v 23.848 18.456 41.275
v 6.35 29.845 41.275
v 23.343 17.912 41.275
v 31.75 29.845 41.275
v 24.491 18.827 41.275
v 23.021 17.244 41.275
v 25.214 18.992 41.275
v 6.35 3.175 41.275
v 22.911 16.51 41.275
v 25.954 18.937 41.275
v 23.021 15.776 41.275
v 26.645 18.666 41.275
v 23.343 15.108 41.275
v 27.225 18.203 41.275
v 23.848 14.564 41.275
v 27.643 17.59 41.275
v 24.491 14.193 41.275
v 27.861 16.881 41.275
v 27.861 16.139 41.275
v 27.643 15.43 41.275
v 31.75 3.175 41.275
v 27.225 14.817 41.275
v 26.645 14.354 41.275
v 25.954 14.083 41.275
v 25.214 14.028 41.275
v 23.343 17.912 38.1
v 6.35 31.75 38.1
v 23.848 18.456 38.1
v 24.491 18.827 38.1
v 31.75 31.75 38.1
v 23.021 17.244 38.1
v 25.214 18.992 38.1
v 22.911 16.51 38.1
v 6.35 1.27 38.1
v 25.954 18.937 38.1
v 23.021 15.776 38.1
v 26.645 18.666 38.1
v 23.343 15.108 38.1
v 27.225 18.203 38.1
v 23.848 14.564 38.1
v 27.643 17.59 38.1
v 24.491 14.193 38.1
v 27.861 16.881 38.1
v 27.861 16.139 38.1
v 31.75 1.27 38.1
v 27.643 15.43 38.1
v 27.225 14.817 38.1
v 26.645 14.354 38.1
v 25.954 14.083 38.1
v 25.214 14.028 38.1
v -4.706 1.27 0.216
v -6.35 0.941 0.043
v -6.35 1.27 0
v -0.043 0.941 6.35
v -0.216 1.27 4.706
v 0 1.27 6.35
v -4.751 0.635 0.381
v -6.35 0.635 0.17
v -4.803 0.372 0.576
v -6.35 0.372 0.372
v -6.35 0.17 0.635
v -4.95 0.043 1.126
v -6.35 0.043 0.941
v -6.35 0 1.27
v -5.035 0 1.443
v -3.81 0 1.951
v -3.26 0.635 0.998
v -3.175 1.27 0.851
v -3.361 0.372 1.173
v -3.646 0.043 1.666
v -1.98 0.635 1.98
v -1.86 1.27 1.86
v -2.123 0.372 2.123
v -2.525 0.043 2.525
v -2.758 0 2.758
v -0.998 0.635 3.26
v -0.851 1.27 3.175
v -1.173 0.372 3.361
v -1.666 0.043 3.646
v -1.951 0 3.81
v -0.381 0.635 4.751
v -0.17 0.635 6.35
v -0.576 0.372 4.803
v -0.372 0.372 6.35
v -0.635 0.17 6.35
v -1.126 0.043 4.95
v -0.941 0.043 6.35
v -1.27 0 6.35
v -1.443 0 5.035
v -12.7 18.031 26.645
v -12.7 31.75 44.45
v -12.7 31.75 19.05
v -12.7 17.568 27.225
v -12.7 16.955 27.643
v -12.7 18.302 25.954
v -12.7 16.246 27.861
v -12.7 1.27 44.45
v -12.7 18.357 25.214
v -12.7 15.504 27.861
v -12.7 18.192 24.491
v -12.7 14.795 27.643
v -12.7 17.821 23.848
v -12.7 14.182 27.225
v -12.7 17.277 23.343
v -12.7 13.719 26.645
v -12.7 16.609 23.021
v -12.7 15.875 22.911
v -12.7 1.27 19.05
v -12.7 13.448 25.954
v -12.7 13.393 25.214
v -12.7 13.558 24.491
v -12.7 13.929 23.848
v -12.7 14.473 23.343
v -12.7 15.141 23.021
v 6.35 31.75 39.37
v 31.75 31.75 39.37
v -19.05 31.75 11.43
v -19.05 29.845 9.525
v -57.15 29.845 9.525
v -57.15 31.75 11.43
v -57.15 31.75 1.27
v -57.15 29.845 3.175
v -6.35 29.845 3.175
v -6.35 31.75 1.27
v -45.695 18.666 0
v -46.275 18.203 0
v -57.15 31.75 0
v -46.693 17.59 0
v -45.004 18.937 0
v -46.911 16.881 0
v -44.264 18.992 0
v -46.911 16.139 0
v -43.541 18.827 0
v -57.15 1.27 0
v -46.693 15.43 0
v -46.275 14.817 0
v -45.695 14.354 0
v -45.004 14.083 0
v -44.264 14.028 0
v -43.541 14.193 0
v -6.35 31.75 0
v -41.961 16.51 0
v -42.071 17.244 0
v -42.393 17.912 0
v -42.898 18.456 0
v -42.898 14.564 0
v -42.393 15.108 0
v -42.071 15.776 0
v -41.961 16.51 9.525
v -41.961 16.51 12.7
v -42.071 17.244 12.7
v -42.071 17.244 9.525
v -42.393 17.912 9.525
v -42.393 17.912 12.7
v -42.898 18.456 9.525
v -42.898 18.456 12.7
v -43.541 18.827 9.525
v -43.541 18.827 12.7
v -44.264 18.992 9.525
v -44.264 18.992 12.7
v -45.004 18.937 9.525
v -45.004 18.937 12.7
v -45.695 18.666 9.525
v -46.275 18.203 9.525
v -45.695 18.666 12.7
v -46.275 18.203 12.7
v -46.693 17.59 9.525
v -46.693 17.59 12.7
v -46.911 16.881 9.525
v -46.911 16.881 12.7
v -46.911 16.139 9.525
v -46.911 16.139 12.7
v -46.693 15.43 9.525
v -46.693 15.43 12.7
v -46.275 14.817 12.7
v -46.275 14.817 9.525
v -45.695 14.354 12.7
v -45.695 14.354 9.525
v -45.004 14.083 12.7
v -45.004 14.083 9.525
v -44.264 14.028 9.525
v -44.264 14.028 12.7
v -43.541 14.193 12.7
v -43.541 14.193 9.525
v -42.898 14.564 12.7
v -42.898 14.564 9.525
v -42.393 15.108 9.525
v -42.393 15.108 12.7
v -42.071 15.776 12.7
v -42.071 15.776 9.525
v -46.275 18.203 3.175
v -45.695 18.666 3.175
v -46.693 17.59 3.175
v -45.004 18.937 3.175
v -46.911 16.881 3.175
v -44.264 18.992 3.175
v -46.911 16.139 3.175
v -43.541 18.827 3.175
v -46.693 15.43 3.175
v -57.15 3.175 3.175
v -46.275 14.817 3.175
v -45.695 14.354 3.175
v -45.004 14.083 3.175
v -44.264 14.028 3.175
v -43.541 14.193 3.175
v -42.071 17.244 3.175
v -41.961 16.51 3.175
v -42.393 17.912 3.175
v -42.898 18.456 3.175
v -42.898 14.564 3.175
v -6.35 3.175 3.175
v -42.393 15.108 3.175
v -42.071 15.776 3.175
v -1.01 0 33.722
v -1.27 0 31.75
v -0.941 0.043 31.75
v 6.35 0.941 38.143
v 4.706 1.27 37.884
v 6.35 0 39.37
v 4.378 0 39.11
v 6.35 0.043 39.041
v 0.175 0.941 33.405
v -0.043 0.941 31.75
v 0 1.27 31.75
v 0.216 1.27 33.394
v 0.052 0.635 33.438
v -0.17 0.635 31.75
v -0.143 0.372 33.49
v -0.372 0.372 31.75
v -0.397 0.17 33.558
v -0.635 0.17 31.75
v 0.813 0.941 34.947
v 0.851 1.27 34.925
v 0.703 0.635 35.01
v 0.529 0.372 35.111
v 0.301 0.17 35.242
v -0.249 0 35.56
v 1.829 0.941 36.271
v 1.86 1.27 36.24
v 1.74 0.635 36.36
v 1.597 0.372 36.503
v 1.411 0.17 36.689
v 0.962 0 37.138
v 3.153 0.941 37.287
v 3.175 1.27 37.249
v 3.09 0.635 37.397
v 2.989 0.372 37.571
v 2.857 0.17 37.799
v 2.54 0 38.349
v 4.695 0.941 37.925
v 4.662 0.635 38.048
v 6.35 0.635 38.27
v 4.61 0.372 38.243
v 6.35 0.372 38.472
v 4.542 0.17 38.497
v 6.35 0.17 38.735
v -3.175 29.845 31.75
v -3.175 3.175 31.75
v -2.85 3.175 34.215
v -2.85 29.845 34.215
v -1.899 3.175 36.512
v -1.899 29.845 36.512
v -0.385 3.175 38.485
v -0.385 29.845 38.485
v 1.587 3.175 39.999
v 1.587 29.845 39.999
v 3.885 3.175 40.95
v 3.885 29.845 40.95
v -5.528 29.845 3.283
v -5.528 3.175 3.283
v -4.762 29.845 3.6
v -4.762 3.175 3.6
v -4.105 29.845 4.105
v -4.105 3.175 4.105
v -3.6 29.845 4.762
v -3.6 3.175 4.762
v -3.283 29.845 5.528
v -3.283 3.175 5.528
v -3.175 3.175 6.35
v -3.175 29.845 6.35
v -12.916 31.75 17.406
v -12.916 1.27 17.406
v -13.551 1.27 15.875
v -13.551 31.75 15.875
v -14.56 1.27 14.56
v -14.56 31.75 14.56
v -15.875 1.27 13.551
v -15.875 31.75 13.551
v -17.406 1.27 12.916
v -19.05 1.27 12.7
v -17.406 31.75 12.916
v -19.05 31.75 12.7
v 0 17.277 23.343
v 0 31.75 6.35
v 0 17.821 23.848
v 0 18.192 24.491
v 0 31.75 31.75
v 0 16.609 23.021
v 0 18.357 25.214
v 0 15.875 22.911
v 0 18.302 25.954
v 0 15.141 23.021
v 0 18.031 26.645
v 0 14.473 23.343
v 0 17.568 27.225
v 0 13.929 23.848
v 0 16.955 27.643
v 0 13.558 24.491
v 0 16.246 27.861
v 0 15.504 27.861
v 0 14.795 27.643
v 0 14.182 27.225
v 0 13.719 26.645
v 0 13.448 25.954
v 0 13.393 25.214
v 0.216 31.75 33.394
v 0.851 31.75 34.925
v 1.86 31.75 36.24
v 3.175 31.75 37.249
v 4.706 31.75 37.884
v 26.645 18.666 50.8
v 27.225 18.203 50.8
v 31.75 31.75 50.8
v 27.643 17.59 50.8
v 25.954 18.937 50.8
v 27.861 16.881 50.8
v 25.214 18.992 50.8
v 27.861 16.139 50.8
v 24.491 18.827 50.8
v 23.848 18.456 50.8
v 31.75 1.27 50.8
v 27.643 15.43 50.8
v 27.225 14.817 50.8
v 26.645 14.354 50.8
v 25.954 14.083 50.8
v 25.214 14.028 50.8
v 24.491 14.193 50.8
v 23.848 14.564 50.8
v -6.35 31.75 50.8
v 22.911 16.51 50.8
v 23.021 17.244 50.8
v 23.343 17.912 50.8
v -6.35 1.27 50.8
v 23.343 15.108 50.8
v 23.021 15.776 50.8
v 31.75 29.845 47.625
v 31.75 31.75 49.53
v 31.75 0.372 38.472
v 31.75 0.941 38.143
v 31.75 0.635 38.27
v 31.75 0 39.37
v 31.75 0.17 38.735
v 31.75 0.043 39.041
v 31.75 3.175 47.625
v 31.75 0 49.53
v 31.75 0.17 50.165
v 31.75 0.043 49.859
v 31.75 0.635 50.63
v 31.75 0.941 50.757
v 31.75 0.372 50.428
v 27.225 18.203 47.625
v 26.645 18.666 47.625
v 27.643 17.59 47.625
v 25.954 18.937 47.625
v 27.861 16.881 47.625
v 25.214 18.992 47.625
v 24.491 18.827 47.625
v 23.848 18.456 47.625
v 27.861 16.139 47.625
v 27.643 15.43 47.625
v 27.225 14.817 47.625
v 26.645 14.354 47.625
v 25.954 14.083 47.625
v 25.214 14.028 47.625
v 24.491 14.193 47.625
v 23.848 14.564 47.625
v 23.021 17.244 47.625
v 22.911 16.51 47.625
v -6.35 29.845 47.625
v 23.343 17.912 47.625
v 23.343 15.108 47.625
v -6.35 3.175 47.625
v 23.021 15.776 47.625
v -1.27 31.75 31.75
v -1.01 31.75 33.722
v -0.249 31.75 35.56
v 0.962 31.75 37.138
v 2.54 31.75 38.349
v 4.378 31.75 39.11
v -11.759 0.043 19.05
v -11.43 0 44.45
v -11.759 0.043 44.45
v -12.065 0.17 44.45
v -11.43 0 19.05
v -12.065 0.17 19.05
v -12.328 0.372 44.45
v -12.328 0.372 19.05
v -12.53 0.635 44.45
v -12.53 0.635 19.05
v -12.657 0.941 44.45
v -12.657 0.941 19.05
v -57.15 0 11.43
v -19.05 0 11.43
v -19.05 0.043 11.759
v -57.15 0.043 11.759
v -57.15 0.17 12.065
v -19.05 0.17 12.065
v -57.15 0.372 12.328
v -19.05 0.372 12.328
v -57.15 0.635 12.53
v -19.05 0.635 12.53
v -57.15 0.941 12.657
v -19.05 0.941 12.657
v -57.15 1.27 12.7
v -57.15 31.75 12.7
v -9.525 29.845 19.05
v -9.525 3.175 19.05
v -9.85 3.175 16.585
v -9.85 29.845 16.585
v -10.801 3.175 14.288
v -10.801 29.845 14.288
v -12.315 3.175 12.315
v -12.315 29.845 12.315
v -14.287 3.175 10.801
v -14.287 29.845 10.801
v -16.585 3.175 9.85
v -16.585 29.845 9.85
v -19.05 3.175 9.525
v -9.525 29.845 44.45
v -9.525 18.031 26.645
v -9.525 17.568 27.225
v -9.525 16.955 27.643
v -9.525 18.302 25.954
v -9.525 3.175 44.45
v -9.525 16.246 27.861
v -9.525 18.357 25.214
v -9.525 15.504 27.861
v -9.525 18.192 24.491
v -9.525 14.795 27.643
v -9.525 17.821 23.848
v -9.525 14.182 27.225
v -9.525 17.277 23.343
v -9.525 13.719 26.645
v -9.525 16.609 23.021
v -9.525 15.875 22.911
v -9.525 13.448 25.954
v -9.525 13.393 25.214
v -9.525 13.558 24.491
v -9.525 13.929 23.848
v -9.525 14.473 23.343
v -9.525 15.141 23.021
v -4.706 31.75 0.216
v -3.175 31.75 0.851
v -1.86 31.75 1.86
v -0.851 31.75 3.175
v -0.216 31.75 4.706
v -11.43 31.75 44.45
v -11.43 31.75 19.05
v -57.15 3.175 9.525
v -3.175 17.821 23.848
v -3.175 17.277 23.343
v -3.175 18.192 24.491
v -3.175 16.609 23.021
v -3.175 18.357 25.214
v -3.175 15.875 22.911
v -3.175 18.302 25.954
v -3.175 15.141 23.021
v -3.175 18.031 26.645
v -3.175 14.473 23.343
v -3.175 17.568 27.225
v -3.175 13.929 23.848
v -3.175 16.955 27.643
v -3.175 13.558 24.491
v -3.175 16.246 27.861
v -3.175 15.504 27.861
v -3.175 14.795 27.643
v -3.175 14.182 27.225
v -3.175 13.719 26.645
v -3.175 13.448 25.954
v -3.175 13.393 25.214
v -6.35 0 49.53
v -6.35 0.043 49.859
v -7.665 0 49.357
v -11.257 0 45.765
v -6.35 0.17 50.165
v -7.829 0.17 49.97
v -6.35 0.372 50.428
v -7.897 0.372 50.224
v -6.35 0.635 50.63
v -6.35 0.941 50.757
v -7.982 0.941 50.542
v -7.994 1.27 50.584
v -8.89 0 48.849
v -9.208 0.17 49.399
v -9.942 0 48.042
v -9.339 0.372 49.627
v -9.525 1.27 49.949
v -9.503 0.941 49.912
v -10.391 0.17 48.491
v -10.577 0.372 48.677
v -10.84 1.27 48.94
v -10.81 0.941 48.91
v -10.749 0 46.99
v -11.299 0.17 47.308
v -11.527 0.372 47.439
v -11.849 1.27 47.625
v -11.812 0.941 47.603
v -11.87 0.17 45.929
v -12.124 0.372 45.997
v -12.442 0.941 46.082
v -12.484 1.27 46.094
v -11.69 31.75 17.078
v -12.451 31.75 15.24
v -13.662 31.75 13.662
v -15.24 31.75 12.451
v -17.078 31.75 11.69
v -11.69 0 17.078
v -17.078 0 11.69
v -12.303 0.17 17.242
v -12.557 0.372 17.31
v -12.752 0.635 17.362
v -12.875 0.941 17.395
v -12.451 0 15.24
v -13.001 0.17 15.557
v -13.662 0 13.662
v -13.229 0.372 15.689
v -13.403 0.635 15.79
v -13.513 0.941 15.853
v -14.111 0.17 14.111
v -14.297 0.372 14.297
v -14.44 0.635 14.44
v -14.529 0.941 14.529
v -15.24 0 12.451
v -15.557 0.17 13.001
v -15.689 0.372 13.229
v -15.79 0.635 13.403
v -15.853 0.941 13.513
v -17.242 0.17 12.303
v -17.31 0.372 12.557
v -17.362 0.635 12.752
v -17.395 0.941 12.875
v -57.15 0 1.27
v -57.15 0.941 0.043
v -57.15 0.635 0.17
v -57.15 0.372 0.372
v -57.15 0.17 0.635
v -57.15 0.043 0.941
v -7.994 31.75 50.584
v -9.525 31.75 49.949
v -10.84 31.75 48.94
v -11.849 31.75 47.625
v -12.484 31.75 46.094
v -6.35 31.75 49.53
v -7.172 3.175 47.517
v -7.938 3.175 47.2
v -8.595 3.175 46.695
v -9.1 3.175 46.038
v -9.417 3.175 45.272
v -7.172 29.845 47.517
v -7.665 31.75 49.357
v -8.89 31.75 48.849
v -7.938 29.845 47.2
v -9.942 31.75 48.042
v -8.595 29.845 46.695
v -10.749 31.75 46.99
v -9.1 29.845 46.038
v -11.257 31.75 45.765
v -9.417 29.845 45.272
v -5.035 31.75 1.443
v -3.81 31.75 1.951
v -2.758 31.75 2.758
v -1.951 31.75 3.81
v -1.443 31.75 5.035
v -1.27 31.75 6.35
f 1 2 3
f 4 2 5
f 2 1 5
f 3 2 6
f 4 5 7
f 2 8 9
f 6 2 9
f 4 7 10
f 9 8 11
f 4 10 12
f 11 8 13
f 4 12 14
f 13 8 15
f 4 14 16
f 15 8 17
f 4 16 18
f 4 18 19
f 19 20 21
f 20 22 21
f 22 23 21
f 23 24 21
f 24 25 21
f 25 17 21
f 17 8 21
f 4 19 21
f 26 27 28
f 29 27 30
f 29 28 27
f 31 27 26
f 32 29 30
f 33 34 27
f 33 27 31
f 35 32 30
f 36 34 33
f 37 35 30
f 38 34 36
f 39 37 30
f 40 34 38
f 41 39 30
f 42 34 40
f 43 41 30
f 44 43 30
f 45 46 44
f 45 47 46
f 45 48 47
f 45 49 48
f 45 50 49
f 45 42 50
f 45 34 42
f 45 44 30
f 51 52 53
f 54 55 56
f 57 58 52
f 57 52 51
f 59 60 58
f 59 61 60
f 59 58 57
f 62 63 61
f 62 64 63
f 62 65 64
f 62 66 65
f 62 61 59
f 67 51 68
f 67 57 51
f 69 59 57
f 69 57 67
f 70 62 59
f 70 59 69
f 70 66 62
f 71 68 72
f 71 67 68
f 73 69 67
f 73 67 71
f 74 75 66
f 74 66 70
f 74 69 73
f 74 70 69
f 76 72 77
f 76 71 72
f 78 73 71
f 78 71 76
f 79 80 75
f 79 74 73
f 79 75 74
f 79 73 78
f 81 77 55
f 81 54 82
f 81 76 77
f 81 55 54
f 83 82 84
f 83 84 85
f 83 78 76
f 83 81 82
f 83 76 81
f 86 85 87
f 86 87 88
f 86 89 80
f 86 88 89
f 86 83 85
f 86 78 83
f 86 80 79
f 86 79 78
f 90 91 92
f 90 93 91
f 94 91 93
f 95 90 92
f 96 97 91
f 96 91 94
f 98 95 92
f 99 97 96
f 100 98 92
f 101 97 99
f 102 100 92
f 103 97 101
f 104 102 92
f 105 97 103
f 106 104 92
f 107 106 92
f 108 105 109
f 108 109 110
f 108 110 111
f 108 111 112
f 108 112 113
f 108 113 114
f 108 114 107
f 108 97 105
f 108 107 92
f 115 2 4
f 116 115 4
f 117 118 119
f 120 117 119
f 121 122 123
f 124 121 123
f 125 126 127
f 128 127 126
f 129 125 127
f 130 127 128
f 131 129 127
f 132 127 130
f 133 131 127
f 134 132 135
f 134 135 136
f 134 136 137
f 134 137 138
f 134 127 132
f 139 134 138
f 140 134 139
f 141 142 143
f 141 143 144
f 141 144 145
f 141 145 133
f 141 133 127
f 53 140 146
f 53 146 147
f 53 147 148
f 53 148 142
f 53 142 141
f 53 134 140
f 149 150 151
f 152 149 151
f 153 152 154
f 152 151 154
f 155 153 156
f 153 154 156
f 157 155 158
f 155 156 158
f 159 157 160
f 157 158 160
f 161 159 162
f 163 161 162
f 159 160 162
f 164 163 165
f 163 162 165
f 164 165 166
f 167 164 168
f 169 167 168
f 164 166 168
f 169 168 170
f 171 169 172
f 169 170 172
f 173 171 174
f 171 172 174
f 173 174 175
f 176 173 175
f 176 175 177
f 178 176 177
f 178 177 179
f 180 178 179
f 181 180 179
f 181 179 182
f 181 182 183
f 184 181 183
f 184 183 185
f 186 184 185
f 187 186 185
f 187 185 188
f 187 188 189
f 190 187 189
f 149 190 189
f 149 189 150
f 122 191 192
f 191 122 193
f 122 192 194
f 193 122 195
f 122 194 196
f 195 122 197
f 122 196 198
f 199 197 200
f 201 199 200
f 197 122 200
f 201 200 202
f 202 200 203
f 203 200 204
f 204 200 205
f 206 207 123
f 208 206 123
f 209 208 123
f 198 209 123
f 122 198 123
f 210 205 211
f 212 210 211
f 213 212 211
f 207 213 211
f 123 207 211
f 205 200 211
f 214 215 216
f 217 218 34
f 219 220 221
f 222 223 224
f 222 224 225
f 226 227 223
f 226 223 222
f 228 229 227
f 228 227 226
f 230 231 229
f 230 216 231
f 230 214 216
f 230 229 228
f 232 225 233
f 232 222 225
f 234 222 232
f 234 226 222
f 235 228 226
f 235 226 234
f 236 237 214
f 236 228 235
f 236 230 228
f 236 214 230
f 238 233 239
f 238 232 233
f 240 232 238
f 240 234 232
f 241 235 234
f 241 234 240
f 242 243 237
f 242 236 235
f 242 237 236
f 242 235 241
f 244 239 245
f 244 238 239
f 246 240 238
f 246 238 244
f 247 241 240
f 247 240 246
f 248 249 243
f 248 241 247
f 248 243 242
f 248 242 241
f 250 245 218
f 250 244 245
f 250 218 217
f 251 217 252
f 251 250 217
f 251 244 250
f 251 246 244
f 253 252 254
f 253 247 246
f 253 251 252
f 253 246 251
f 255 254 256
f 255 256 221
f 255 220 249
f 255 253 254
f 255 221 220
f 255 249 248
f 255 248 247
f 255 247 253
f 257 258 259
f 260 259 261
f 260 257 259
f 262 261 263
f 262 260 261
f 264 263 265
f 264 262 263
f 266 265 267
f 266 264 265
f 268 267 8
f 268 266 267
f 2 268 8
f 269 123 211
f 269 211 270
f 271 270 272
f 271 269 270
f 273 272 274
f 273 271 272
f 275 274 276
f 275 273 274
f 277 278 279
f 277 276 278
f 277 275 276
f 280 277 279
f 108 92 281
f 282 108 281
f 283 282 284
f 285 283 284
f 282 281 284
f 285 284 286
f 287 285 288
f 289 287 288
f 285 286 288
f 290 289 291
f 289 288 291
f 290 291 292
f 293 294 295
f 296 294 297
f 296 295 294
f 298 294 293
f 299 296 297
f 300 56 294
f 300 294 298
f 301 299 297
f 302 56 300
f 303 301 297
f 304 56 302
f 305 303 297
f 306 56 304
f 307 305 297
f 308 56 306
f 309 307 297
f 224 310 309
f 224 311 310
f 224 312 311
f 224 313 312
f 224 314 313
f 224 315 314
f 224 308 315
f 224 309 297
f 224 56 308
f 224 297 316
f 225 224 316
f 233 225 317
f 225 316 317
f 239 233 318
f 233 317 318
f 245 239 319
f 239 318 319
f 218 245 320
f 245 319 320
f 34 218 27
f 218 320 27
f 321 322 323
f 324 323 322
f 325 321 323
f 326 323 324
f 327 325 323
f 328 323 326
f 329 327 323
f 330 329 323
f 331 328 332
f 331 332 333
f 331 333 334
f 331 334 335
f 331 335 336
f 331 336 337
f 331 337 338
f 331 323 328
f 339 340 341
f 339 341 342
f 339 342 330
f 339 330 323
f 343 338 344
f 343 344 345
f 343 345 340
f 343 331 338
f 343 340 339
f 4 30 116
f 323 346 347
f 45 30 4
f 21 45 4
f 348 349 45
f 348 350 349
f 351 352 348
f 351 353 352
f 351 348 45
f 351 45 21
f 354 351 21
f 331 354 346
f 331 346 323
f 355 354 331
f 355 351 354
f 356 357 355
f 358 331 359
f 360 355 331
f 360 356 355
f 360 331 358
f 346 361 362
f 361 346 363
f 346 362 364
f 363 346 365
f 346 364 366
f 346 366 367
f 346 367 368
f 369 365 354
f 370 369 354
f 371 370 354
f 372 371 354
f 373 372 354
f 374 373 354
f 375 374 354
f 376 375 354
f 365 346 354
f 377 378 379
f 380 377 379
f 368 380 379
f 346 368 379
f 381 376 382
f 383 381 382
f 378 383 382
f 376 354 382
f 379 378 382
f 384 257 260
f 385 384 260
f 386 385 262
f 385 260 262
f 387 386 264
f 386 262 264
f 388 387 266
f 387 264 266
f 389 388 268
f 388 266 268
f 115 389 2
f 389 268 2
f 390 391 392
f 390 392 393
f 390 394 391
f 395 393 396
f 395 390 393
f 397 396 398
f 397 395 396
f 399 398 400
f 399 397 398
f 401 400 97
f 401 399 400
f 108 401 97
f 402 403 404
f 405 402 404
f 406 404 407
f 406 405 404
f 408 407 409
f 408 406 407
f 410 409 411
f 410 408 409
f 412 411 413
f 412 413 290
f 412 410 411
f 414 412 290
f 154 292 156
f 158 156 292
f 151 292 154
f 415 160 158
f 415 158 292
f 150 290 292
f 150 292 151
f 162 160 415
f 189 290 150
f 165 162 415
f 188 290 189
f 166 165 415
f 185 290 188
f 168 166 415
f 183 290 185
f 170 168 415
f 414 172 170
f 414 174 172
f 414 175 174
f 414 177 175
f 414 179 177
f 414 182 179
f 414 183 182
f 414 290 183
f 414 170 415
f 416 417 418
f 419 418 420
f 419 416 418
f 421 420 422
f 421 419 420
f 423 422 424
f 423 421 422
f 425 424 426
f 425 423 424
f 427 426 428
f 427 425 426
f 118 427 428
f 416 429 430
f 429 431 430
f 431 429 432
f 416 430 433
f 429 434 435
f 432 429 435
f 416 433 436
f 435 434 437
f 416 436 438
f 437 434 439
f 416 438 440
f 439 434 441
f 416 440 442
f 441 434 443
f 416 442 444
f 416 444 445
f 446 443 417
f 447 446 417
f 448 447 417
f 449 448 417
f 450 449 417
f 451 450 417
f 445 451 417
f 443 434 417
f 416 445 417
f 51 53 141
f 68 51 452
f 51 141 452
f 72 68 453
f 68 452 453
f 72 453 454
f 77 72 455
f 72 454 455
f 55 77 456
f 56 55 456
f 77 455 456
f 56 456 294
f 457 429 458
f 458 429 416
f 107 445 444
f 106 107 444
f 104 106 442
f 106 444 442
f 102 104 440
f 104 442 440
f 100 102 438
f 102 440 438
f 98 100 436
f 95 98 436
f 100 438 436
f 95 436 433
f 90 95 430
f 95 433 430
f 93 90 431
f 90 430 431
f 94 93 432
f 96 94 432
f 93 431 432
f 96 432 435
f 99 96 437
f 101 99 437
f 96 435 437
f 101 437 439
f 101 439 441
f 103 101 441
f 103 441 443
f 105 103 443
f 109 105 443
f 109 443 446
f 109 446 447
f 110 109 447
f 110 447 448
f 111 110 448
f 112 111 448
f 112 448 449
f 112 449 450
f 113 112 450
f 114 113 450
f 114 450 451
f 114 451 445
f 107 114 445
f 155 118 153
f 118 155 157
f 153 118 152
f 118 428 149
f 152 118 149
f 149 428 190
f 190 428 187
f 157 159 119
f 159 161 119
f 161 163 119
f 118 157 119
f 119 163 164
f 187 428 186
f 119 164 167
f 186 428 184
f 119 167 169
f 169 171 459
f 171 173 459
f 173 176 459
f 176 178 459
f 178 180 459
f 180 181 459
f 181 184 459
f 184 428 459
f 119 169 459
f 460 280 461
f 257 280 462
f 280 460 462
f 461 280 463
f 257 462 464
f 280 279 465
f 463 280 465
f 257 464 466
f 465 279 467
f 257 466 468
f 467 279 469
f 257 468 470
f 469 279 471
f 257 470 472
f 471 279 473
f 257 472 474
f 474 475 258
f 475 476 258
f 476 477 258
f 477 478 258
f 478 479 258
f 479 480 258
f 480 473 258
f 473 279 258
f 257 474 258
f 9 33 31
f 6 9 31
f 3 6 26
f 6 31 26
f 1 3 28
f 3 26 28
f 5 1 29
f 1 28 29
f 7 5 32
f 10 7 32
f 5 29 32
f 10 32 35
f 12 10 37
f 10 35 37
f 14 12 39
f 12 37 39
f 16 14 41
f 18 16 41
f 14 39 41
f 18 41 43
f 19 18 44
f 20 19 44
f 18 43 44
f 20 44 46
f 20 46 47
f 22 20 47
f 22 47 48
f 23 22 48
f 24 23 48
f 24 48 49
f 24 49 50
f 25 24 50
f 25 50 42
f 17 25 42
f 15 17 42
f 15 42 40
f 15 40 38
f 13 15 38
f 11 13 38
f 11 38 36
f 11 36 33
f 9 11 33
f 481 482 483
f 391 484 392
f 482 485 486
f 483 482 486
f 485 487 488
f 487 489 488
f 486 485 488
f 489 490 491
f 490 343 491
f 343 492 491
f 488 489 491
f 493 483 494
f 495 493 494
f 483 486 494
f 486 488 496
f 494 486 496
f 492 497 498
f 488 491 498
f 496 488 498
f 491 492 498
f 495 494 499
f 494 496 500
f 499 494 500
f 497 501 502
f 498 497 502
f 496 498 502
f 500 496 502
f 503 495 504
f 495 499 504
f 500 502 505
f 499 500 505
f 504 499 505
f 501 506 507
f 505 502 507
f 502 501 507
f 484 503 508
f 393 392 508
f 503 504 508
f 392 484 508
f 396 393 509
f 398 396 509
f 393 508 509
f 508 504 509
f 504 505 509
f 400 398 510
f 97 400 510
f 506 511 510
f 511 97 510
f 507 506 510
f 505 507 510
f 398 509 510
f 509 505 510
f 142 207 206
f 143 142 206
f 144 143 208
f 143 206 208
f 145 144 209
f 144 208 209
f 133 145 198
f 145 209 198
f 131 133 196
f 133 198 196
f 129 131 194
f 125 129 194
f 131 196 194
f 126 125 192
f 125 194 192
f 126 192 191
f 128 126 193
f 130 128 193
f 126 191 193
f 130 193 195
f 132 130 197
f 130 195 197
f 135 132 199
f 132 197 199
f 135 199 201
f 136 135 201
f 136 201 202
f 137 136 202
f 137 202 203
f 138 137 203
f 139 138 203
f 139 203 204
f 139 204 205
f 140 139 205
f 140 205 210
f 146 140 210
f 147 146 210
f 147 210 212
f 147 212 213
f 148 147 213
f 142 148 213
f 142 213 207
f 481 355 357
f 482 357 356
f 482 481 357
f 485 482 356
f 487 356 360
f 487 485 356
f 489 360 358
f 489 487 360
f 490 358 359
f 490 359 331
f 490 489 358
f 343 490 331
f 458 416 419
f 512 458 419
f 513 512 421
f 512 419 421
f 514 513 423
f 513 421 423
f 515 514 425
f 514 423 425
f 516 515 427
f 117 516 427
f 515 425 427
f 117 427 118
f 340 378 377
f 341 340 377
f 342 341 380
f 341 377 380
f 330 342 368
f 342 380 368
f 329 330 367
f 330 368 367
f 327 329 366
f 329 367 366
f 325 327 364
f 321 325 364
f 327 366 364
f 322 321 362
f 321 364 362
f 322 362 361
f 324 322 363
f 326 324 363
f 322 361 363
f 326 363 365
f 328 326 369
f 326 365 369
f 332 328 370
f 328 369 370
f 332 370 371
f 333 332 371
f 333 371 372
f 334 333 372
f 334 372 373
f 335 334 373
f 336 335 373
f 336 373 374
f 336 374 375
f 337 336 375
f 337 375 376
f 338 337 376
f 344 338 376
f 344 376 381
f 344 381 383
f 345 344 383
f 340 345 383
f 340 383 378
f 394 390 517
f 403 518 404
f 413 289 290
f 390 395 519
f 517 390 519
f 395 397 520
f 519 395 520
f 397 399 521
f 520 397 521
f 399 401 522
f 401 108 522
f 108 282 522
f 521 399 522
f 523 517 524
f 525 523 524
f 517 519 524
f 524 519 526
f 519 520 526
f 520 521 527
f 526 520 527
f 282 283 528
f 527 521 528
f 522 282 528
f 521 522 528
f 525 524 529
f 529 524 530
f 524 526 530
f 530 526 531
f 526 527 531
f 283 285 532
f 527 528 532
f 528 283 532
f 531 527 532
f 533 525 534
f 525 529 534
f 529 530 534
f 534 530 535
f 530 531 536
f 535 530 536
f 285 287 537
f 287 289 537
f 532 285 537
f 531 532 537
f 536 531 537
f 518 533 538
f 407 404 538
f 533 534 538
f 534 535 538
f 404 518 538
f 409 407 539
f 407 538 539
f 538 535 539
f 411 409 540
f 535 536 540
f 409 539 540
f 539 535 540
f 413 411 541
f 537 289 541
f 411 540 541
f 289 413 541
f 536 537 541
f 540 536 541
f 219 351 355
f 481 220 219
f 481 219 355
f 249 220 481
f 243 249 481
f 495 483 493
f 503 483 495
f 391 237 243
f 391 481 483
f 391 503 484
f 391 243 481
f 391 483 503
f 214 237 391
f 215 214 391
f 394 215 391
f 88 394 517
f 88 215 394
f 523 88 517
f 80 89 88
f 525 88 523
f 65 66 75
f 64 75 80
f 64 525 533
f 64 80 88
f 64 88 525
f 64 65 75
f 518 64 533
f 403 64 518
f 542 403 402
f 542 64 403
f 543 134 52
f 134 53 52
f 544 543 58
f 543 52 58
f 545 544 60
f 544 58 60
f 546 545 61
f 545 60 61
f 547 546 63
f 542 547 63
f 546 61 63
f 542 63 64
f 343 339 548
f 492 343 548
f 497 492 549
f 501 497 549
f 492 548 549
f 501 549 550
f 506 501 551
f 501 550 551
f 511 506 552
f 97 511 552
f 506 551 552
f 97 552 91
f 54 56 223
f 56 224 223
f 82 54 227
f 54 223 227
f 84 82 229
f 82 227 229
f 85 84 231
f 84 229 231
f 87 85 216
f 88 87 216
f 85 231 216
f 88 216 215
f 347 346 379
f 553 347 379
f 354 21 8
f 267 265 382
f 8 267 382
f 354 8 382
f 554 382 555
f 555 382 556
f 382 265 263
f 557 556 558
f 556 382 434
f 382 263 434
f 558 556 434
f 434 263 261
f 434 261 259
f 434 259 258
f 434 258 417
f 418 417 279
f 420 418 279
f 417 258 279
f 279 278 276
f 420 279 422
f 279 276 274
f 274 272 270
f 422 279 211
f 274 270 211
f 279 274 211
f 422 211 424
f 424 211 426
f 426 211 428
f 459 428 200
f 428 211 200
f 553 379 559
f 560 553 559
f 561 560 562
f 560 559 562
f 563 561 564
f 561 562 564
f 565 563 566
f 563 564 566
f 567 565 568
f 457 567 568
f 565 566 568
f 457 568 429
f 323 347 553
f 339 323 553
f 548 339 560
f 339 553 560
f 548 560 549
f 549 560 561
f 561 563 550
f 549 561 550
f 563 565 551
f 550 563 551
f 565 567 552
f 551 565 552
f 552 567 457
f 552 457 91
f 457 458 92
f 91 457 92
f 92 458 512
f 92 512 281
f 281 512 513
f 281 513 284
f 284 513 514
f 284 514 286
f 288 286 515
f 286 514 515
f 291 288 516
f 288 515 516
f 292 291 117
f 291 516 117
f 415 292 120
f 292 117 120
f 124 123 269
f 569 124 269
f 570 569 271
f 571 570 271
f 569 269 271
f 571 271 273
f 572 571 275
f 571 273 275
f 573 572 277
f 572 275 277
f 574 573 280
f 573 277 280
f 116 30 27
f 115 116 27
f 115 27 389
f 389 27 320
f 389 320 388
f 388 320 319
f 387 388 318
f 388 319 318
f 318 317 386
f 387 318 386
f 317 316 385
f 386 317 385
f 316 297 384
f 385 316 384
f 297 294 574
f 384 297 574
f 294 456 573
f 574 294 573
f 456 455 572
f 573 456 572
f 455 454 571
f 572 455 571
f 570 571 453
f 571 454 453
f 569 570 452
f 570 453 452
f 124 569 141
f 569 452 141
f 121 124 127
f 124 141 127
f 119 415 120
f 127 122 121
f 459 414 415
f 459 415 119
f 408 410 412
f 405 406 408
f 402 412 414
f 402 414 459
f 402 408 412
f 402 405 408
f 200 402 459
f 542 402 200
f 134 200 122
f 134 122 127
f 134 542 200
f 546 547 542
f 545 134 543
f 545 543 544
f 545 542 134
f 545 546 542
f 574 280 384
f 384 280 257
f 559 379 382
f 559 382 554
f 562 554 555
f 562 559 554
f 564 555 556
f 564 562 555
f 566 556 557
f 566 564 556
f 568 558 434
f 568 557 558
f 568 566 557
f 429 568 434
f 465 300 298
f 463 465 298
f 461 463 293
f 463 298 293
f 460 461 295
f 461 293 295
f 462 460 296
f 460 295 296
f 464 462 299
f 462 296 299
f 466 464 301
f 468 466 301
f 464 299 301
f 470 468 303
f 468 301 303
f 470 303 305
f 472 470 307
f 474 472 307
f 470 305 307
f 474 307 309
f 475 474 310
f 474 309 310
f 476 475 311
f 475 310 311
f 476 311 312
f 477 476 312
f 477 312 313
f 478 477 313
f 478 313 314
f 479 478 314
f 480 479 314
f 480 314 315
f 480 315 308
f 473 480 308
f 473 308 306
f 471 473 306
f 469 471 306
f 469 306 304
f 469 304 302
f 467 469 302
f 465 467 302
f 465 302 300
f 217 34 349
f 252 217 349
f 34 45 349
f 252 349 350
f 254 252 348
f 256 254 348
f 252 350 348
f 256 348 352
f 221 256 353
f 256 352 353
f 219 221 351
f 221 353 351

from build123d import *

# Parameters (mm, degrees)
BOSS_EXTRUDE1_DEPTH        = 31.75
FILLET1_R                  = 6.35
SHELL1_T                   = -3.175
FILLET2_R                  = 1.27
CHAMFER1_SIZE              = 1.905
F_9_0_196_DIAMETER_HOLE1_D = 4.9784
F_9_0_196_DIAMETER_HOLE2_D = 4.9784
F_9_0_196_DIAMETER_HOLE3_D = 4.9784


with BuildPart() as part:
    # Sketch1 → Boss-Extrude1 (new body)
    with BuildSketch(Plane(origin=(0, 0, 0), x_dir=(1, 0, 0), z_dir=(0, 1, 0))):
        Polygon((-57.15, 0), (0, 0), (0, -38.1), (31.75, -38.1), (31.75, -50.8), (-12.7, -50.8), (-12.7, -12.7), (-57.15, -12.7), align=None)
    extrude(amount=BOSS_EXTRUDE1_DEPTH)

    # Fillet1
    fillet1_edges = [part.edges().sort_by_distance(p)[0] for p in [
        (0, 15.875, 0),
        (0, 15.875, 38.1),
        (-12.7, 15.875, 50.8),
        (-12.7, 15.875, 12.7),
    ]]
    fillet(fillet1_edges, radius=FILLET1_R)

    # Shell1
    shell1_openings = [part.faces().sort_by_distance(p)[0] for p in [
        (-8.466666667, 31.75, 25.4),
        (31.75, 15.875, 44.45),
        (-57.15, 15.875, 6.35),
    ]]
    offset(amount=SHELL1_T, openings=shell1_openings, kind=Kind.INTERSECTION)

    # Fillet2
    fillet2_edges = [part.edges().sort_by_distance(p)[0] for p in [
        (-38.1, 0, 12.7),
        (12.7, 0, 50.8),
        (-31.75, 0, 0),
        (0, 0, 19.05),
        (-12.7, 0, 31.75),
        (-1.859871939, 0, 1.859871939),
        (-10.840128061, 0, 48.940128061),
        (-14.559871939, 0, 14.559871939),
        (1.859871939, 0, 36.240128061),
        (19.05, 0, 38.1),
    ]]
    fillet(fillet2_edges, radius=FILLET2_R)

    # Chamfer1
    chamfer1_edges = [part.edges().sort_by_distance(p)[0] for p in [
        (-9.525, 31.75, 31.75),
        (-8.59506403, 31.75, 46.69506403),
        (12.7, 31.75, 47.625),
        (19.05, 31.75, 41.275),
        (-0.385192091, 31.75, 38.485192091),
        (-3.175, 31.75, 19.05),
        (-4.10493597, 31.75, 4.10493597),
        (-31.75, 31.75, 3.175),
        (-38.1, 31.75, 9.525),
        (-12.314807909, 31.75, 12.314807909),
    ]]
    chamfer(chamfer1_edges, length=CHAMFER1_SIZE)

    # #9 (0.196) Diameter Hole1 (through all)
    with Locations(Plane.ZY.offset(12.7)):
        with Locations((25.4, 15.875)):
            Hole(F_9_0_196_DIAMETER_HOLE1_D / 2)

    # #9 (0.196) Diameter Hole2 (through all)
    with Locations(Plane(origin=(0, 0, 0), x_dir=(-1, 0, 0), z_dir=(0, 0, -1))):
        with Locations((44.45, 16.51)):
            Hole(F_9_0_196_DIAMETER_HOLE2_D / 2)

    # #9 (0.196) Diameter Hole3 (through all)
    with Locations(Plane.XY.offset(50.8)):
        with Locations((25.4, 16.51)):
            Hole(F_9_0_196_DIAMETER_HOLE3_D / 2)


solid = part.part
